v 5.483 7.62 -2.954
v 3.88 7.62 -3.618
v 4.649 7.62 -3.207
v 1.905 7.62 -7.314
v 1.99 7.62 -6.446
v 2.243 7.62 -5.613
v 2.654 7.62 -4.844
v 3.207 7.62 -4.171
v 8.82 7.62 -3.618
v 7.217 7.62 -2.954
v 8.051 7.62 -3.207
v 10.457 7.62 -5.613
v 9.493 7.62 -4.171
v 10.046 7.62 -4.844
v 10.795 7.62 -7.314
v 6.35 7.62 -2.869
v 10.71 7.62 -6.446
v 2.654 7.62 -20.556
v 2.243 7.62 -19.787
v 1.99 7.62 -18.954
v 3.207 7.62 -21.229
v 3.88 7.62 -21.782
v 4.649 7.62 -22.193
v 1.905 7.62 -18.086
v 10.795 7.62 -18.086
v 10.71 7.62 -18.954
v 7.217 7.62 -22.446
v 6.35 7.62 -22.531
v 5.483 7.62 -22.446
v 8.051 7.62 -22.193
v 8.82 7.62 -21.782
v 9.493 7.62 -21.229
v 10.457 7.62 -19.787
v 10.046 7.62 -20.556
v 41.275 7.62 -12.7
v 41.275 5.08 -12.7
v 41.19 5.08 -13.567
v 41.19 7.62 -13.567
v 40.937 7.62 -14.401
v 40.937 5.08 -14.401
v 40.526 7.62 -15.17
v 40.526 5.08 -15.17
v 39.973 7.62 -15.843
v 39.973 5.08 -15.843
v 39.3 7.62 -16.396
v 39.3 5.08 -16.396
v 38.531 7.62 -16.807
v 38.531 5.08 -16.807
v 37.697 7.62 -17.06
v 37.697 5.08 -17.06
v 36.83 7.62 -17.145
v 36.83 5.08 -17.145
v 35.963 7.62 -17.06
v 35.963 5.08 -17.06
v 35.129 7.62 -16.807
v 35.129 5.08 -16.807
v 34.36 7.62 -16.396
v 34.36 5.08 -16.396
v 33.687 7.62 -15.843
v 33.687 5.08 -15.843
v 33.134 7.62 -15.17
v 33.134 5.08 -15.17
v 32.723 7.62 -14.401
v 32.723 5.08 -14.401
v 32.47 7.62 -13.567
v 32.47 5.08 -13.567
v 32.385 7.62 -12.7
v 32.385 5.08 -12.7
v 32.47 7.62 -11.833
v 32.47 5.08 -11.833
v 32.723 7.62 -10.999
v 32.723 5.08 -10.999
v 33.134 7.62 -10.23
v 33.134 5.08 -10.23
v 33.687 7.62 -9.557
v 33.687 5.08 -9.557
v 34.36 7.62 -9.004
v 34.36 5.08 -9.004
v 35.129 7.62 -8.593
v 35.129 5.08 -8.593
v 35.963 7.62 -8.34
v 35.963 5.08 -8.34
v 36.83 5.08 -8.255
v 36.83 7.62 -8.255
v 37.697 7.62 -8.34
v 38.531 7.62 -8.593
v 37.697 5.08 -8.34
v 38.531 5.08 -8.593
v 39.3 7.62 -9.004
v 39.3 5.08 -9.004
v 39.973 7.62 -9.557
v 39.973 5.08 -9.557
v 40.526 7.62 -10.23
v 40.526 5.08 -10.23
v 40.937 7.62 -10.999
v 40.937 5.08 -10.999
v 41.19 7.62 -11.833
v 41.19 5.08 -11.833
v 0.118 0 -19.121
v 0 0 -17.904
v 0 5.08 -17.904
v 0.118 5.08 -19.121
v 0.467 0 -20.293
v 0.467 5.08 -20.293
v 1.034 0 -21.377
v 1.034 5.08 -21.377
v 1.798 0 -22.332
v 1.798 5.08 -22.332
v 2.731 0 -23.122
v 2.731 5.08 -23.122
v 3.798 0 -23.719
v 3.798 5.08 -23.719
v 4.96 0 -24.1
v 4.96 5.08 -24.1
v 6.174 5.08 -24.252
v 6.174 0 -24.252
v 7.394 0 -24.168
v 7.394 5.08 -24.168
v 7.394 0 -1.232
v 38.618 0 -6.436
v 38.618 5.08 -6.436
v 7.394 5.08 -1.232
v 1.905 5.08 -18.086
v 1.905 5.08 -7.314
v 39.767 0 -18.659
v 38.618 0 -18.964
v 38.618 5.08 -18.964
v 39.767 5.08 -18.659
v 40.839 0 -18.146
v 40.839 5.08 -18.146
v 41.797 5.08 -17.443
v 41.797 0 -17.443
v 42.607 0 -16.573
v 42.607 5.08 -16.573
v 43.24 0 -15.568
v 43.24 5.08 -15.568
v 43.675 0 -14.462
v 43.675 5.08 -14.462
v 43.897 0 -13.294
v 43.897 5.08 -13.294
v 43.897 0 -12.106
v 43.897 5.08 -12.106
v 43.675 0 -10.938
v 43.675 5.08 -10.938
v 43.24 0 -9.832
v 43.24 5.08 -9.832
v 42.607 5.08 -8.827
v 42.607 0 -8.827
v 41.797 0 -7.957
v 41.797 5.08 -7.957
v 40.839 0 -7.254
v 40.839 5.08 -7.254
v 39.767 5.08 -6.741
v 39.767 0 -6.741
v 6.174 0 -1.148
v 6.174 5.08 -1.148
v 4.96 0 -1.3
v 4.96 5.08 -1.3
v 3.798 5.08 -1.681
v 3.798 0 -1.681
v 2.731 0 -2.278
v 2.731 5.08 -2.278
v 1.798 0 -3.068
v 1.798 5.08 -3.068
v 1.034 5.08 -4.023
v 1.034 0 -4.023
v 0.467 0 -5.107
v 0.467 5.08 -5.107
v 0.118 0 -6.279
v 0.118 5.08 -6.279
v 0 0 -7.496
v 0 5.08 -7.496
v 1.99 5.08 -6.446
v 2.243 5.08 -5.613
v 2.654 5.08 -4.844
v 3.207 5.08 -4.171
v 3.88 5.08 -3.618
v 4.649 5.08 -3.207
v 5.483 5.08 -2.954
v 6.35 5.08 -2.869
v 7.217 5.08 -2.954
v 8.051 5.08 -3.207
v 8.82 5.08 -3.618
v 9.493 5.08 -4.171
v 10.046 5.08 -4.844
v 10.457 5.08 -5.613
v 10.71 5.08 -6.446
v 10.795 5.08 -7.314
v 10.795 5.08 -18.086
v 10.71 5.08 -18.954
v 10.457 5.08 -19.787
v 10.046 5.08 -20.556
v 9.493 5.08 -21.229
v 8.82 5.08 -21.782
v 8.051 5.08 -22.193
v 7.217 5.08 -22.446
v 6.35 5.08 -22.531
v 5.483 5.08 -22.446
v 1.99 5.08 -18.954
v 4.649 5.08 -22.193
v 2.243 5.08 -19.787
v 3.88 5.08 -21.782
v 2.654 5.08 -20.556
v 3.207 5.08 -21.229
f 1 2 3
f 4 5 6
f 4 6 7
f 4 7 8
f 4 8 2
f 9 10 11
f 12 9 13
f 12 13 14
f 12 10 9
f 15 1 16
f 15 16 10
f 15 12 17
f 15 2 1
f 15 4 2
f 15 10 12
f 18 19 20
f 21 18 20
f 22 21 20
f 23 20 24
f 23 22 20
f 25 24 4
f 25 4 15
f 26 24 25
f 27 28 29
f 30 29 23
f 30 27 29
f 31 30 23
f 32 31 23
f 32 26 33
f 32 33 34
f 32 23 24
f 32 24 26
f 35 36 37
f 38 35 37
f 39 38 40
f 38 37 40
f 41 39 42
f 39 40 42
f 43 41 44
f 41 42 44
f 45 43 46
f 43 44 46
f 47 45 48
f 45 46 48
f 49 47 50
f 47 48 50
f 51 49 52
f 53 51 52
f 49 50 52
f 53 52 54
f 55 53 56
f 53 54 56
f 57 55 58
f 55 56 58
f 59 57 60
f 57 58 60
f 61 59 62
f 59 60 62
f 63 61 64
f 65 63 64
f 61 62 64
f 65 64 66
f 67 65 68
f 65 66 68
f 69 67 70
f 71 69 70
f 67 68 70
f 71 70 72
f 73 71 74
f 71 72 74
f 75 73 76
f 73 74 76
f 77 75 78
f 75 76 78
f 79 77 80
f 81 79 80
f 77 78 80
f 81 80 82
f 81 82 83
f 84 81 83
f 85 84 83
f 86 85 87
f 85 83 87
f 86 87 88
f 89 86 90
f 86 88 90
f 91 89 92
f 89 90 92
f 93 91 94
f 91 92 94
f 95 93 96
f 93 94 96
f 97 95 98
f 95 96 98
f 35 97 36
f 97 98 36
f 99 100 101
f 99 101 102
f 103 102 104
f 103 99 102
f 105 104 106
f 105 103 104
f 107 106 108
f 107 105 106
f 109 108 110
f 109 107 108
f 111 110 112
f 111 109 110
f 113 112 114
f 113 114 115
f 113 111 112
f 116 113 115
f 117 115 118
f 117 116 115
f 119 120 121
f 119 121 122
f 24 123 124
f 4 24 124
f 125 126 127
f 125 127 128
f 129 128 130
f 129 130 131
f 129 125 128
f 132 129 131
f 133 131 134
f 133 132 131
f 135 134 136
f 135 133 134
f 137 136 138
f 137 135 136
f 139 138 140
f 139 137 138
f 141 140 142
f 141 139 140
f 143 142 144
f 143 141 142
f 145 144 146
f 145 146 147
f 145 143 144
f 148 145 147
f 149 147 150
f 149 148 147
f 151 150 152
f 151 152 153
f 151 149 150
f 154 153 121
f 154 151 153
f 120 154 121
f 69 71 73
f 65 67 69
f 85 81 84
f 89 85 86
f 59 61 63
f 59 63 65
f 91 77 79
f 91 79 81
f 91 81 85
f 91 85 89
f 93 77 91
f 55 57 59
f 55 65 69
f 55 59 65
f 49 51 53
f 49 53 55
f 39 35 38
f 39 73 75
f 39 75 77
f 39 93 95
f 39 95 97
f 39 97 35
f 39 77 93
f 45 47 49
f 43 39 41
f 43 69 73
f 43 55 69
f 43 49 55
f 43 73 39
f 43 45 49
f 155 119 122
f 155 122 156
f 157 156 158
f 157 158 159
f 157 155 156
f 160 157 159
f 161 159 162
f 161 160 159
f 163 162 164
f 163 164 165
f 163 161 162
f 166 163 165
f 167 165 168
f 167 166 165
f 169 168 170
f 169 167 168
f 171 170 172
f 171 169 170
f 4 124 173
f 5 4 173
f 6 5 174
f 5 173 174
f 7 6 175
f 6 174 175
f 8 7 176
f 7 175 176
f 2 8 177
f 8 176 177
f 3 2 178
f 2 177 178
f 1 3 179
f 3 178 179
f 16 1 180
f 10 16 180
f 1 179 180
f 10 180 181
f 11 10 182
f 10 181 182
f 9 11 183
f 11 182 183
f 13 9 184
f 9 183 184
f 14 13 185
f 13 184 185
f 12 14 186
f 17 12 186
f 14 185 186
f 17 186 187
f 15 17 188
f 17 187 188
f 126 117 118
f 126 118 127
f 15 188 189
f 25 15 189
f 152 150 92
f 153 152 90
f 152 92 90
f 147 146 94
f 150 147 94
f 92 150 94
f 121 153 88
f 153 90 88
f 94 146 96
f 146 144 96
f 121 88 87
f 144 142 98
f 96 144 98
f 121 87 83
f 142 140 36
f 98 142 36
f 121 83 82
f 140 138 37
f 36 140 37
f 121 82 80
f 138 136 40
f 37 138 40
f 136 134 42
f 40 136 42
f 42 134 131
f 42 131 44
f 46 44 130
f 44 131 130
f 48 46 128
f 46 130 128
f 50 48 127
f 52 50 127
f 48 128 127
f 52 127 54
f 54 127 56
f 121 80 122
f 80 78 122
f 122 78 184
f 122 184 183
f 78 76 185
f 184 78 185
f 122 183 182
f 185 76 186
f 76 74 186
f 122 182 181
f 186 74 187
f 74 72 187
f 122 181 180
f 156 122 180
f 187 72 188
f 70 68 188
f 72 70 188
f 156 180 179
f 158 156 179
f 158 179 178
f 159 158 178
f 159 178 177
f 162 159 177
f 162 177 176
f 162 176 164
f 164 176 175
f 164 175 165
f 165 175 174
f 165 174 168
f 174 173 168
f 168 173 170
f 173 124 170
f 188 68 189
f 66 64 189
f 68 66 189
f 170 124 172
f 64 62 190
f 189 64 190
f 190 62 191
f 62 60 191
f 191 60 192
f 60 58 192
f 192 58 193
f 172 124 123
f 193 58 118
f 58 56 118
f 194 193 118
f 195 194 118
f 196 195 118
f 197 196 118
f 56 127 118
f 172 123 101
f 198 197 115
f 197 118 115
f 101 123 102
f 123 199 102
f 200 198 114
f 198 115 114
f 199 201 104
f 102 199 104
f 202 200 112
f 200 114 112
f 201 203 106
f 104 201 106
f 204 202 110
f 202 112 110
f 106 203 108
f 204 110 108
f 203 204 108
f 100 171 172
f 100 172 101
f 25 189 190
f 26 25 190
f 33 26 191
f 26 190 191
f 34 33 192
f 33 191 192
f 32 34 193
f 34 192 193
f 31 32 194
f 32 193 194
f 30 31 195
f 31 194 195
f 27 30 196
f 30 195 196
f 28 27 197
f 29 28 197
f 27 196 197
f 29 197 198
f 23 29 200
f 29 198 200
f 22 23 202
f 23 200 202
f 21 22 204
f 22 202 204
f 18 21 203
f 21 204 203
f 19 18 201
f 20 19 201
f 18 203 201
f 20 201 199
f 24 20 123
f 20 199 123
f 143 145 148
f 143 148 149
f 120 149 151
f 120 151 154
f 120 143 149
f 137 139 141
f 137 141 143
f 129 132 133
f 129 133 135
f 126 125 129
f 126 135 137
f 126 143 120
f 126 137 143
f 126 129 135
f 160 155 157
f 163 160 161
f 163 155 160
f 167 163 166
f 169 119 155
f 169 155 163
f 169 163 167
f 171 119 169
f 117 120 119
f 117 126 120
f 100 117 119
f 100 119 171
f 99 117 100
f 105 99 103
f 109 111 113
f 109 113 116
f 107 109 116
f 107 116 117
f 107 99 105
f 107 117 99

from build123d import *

# Parameters (mm, degrees)
BOSS_EXTRUDE1_DEPTH = 5.08
SKETCH5_R           = 4.445
BOSS_EXTRUDE2_DEPTH = 2.54


with BuildPart() as part:
    # Sketch1 → Boss-Extrude1 (new body)
    with BuildSketch(Plane(origin=(0, 0, 0), x_dir=(1, 0, 0), z_dir=(0, 1, 0))):
        with BuildLine():
            Line((0, 7.495923678), (0, 17.904076322))
            ThreePointArc((0, 17.904076322), (2.24551941, 22.749253211), (7.393933569, 24.167677738))
            Line((7.393933569, 24.167677738), (38.618391502, 18.963601416))
            ThreePointArc((38.618391502, 18.963601416), (43.924457933, 12.7), (38.618391502, 6.436398584))
            Line((38.618391502, 6.436398584), (7.393933569, 1.232322262))
            ThreePointArc((7.393933569, 1.232322262), (2.24551941, 2.650746789), (0, 7.495923678))
        make_face()
    extrude(amount=BOSS_EXTRUDE1_DEPTH)

    # Sketch5 → Boss-Extrude2 (add)
    with BuildSketch(Plane(origin=(0, 5.08, 0), x_dir=(1, 0, 0), z_dir=(0, 1, 0))):
        with BuildLine():
            Line((1.905, 18.086409435), (1.905, 7.313590565))
            ThreePointArc((1.905, 7.313590565), (6.35, 2.868590565), (10.795, 7.313590565))
            Line((10.795, 7.313590565), (10.795, 18.086409435))
            ThreePointArc((10.795, 18.086409435), (6.35, 22.531409435), (1.905, 18.086409435))
        make_face()
        with Locations((36.83, 12.7)):
            Circle(SKETCH5_R)
    extrude(amount=BOSS_EXTRUDE2_DEPTH)


solid = part.part
